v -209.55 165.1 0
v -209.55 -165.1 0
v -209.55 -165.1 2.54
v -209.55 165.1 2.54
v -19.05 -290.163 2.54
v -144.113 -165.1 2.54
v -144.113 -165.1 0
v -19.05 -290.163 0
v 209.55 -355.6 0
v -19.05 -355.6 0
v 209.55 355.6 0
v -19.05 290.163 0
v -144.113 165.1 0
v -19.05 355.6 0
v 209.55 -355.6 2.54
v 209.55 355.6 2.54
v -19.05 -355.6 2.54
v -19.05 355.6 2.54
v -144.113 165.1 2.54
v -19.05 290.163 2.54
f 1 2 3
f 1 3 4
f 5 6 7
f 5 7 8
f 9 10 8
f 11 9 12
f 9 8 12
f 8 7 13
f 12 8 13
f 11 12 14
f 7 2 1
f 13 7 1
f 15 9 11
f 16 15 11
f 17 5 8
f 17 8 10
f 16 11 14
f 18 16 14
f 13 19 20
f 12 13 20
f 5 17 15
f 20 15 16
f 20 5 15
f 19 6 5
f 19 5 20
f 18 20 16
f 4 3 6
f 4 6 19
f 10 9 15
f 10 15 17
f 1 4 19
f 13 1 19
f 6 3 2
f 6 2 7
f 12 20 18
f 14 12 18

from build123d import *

# Parameters (mm, degrees)
SKETCH1_W           = 711.2
SKETCH1_H           = 419.1
BOSS_EXTRUDE1_DEPTH = 2.54
CUT_EXTRUDE1_DEPTH  = 413.757815311


with BuildPart() as part:
    # Sketch1 → Boss-Extrude1 (new body)
    with BuildSketch(Plane(origin=(0, 0, 0), x_dir=(0, 1, 0), z_dir=(0, 0, 1))):
        Rectangle(SKETCH1_W, SKETCH1_H)
    extrude(amount=BOSS_EXTRUDE1_DEPTH)

    # Sketch2 → Cut-Extrude1 (cut, through all)
    with BuildSketch(Plane.XY.offset(2.54)):
        Polygon((-144.11270055, 165.1), (-19.05, 290.16270055), (-19.05, 355.6), (-209.55, 355.6), (-209.55, 165.1), align=None)
        Polygon((-19.05, -355.6), (-209.55, -355.6), (-209.55, -165.1), (-144.11270055, -165.1), (-19.05, -290.16270055), align=None)
    extrude(amount=-CUT_EXTRUDE1_DEPTH, mode=Mode.SUBTRACT)


solid = part.part
